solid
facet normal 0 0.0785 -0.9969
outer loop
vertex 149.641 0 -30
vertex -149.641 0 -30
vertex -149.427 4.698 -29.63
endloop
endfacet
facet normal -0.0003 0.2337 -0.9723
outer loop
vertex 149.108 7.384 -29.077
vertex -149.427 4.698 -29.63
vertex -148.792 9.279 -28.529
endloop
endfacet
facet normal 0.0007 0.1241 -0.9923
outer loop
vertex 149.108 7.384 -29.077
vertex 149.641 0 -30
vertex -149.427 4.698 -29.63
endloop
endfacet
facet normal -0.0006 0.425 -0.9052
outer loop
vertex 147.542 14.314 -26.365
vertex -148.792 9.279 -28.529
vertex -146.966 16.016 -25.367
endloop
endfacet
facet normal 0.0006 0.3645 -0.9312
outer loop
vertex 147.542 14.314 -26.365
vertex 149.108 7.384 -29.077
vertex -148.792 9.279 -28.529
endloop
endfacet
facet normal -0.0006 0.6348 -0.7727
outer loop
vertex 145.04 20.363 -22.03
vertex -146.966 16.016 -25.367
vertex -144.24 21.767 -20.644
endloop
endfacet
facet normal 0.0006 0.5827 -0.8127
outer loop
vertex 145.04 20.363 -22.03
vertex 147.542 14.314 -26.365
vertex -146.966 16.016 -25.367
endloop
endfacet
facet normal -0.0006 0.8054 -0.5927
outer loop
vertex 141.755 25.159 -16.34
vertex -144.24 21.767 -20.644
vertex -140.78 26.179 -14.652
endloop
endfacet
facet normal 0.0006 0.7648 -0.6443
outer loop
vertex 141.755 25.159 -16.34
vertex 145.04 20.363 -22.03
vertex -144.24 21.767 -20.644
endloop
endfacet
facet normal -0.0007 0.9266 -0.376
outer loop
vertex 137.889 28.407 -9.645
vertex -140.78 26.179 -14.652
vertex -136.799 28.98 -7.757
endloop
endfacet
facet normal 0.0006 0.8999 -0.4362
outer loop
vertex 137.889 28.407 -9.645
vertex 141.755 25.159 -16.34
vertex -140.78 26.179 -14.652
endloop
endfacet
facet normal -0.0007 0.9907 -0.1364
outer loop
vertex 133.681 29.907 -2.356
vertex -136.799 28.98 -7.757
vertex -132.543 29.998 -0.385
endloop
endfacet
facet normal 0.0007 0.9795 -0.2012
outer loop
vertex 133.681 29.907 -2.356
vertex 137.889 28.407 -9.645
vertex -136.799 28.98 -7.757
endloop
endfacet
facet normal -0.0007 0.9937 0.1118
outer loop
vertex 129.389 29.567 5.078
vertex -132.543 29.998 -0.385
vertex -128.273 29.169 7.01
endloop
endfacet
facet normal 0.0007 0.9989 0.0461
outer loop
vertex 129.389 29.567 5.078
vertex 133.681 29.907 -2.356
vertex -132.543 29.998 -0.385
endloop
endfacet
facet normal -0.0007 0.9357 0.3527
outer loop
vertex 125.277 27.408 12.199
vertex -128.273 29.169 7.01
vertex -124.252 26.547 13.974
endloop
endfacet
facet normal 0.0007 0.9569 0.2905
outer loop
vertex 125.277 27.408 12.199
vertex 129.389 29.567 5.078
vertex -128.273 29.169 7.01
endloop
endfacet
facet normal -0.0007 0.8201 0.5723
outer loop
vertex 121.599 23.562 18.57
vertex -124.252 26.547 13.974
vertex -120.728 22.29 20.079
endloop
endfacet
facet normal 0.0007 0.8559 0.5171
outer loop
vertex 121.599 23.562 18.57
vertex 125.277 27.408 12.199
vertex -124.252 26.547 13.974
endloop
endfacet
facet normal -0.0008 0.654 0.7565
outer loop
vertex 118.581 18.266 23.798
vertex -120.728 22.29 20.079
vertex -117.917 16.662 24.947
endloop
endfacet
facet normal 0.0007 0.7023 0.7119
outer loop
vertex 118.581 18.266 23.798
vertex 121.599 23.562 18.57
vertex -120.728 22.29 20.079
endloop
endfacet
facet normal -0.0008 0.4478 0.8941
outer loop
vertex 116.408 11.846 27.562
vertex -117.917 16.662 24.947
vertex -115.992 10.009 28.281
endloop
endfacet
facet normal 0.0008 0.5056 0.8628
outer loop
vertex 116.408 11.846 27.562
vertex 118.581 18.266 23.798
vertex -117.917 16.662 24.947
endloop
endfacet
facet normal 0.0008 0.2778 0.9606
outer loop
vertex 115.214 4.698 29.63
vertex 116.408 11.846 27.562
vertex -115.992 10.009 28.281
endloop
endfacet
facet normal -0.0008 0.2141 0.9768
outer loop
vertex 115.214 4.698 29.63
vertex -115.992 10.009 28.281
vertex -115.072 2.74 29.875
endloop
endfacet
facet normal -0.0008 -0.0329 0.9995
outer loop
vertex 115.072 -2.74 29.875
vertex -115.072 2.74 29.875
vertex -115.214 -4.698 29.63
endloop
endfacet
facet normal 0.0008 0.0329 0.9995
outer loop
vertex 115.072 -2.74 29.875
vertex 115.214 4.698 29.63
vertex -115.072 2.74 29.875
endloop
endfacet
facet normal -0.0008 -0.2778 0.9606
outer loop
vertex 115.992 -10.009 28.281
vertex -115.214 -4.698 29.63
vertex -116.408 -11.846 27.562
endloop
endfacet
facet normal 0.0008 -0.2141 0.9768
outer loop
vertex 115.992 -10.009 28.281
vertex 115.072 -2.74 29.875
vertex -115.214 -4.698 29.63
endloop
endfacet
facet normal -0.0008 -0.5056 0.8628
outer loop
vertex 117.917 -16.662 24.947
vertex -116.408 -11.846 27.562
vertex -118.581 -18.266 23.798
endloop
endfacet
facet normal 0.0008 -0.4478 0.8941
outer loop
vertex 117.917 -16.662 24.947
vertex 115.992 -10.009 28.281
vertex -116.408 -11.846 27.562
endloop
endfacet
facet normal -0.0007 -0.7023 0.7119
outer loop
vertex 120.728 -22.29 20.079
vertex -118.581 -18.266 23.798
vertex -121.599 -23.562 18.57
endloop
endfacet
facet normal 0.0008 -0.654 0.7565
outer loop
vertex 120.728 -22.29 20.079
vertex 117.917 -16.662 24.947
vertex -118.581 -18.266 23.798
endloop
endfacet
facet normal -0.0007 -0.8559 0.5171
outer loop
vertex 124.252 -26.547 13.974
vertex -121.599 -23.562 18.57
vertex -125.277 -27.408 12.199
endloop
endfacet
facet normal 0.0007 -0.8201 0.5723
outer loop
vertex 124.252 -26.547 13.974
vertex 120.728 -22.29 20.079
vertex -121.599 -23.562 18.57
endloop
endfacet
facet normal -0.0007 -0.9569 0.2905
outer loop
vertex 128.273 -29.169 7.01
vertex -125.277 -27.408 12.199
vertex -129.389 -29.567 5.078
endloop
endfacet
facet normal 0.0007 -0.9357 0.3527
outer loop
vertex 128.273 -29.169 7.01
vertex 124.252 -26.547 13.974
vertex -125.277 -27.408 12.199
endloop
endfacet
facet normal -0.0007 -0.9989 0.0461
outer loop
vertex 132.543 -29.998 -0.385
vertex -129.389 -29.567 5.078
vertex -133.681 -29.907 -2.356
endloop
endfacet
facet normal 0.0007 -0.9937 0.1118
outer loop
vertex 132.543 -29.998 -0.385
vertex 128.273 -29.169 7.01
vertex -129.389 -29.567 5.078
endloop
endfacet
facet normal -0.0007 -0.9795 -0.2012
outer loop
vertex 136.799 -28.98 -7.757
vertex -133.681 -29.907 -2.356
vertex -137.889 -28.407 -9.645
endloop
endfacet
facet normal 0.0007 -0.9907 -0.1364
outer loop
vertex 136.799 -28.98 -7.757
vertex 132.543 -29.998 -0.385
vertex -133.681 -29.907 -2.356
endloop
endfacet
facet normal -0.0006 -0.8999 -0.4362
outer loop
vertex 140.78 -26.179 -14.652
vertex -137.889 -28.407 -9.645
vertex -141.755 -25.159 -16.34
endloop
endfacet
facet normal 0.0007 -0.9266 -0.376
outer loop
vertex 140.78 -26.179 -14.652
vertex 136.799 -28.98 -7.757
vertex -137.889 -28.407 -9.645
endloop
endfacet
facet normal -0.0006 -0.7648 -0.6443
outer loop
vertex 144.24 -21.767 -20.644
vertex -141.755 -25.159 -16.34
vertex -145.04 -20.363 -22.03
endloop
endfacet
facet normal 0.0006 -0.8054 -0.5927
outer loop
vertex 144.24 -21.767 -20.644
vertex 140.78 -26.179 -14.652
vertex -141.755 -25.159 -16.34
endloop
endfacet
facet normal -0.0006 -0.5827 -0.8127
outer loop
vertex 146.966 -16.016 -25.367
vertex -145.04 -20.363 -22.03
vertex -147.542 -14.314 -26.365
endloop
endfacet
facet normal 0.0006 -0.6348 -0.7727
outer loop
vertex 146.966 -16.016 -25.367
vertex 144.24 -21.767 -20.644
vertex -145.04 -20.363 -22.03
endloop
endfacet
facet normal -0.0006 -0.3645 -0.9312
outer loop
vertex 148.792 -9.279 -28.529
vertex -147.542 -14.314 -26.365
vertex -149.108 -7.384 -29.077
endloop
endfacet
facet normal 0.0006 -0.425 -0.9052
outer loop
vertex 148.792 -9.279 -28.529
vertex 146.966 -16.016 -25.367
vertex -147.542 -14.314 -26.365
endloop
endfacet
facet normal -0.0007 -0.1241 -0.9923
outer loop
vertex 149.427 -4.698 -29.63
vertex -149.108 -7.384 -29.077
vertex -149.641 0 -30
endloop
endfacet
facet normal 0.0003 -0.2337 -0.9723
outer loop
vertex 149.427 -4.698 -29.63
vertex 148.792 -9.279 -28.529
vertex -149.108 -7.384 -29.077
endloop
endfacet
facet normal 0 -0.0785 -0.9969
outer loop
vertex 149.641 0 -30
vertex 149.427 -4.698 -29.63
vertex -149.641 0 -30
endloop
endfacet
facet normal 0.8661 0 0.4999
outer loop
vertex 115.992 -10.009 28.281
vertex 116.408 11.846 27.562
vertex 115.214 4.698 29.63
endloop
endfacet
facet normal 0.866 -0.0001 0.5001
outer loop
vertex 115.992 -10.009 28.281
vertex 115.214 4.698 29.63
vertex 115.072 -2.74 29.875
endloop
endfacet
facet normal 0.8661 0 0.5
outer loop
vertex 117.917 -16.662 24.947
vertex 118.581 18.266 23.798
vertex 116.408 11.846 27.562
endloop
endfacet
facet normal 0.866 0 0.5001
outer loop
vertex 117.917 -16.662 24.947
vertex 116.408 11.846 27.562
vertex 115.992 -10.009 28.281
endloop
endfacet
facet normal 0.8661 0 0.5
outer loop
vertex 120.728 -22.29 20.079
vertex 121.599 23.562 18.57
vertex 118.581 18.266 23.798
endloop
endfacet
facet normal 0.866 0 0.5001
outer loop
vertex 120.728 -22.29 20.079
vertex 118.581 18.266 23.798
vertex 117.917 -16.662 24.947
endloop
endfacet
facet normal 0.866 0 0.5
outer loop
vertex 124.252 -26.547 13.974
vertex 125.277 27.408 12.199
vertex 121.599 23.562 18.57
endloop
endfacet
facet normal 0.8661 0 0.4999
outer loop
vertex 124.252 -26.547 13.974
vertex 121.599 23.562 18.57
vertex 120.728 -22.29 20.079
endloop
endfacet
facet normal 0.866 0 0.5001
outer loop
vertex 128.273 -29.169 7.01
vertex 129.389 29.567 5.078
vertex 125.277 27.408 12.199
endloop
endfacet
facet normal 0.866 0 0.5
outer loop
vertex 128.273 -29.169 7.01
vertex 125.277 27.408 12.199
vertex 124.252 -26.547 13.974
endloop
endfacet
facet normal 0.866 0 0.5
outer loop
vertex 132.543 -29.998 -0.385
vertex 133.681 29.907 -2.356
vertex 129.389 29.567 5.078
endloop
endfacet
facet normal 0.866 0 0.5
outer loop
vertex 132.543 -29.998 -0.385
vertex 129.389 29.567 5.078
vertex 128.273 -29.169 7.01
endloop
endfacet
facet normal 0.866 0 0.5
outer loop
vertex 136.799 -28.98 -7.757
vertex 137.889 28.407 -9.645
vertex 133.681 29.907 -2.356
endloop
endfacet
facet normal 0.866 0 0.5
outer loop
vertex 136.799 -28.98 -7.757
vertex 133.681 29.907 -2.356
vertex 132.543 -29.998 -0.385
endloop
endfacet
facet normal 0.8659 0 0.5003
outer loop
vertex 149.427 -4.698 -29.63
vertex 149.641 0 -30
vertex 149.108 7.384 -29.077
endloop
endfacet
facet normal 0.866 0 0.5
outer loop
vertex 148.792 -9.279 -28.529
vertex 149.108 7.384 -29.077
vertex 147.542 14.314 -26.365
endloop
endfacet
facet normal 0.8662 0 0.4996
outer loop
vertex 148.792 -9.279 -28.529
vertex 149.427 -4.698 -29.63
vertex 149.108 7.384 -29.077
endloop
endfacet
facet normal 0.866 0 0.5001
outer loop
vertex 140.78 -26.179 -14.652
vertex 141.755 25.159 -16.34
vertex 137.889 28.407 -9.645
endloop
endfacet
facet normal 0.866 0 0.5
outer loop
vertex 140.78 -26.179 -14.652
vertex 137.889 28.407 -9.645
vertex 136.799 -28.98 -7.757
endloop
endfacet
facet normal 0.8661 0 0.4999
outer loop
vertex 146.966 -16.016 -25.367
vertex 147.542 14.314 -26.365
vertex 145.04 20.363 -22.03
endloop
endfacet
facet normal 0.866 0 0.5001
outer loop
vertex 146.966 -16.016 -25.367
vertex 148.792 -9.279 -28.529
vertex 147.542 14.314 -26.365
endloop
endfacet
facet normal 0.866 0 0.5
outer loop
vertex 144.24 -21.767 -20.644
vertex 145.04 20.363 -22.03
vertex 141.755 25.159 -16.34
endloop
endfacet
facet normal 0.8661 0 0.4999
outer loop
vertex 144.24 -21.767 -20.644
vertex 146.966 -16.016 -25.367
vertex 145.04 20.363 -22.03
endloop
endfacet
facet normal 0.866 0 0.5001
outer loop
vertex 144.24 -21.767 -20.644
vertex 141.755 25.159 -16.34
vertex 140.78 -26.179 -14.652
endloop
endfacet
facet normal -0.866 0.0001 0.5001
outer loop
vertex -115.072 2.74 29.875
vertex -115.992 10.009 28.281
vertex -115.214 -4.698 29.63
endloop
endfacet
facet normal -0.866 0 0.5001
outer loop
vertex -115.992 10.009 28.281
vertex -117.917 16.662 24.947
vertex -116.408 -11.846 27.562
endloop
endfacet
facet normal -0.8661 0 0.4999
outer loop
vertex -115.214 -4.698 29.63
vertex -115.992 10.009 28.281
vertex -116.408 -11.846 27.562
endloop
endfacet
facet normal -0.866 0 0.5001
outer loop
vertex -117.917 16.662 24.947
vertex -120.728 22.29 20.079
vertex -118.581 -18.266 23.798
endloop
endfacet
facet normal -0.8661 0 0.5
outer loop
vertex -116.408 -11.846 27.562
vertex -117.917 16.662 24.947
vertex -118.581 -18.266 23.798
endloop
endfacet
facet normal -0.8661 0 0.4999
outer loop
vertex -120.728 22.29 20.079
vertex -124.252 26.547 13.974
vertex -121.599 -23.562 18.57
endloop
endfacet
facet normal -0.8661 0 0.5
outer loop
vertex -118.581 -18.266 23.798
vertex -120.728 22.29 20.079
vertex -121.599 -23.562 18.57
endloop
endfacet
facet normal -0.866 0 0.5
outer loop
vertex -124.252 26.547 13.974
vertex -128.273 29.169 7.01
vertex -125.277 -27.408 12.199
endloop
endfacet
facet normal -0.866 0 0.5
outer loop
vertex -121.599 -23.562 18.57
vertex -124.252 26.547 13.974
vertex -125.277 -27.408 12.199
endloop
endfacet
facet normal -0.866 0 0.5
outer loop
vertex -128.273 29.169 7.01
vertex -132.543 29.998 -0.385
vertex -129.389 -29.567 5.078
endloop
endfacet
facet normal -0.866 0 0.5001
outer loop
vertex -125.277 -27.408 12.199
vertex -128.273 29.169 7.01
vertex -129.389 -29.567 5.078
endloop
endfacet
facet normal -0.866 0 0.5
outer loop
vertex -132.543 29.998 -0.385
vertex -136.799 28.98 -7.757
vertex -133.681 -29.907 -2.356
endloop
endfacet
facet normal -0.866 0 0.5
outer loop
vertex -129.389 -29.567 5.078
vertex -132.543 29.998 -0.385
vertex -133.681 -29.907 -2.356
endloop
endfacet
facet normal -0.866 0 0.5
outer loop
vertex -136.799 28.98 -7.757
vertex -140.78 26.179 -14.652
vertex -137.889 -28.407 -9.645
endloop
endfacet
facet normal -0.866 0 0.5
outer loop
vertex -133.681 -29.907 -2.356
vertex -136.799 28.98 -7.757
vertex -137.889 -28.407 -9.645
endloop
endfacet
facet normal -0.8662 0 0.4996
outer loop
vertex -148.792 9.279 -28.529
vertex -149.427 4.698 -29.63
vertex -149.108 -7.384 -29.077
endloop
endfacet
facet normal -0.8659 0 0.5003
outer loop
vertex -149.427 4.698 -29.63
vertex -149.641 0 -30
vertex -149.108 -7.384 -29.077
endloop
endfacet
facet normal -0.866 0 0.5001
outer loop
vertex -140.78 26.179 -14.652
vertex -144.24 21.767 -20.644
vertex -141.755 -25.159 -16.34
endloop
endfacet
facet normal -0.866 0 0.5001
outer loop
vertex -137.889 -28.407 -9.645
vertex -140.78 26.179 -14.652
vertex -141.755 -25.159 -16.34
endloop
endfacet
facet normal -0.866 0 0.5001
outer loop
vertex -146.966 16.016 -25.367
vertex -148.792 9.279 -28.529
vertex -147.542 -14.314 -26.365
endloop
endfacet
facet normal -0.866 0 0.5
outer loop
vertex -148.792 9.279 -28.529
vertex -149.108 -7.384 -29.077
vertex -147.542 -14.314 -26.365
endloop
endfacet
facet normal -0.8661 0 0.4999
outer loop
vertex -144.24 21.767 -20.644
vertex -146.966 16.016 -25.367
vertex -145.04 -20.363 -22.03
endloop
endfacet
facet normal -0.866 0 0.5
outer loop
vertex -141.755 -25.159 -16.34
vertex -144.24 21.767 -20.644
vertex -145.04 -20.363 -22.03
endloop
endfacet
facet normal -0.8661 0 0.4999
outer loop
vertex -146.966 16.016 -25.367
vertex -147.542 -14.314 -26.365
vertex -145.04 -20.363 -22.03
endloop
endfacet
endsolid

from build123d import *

# Parameters (mm, degrees)
SKETCH_1_R          = 30
EXTRUDE_1_DEPTH     = 150
SKETCH_2_W          = 109.772001157
SKETCH_2_H          = 80.251500104
CUT_EXTRUDE_1_DEPTH = 266.784573674


with BuildPart() as part:
    # 草图1 → 凸台-拉伸1 (new, symmetric)
    with BuildSketch(Plane(origin=(0, 0, 0), x_dir=(0, 0, -1), z_dir=(1, 0, 0))):
        Circle(SKETCH_1_R)
    extrude(amount=EXTRUDE_1_DEPTH, both=True)

    # 草图2 → 切除-拉伸1 (cut, through all)
    with BuildSketch(Plane(origin=(99.240381057, 0, 57.296460718), x_dir=(0, -1, 0), z_dir=(0.866025403784438, 0, 0.500000000000001))):
        with Locations((-4.460929889, 62.152689719)):
            Rectangle(SKETCH_2_W, SKETCH_2_H)
    cut_extrude_1 = extrude(amount=CUT_EXTRUDE_1_DEPTH, mode=Mode.SUBTRACT)

    # 镜向1: 切除-拉伸1 across plane
    add(cut_extrude_1.mirror(Plane(origin=(0, 0, 0), x_dir=(0, 0, 1), z_dir=(1, 0, 0))), mode=Mode.SUBTRACT)


solid = part.part
